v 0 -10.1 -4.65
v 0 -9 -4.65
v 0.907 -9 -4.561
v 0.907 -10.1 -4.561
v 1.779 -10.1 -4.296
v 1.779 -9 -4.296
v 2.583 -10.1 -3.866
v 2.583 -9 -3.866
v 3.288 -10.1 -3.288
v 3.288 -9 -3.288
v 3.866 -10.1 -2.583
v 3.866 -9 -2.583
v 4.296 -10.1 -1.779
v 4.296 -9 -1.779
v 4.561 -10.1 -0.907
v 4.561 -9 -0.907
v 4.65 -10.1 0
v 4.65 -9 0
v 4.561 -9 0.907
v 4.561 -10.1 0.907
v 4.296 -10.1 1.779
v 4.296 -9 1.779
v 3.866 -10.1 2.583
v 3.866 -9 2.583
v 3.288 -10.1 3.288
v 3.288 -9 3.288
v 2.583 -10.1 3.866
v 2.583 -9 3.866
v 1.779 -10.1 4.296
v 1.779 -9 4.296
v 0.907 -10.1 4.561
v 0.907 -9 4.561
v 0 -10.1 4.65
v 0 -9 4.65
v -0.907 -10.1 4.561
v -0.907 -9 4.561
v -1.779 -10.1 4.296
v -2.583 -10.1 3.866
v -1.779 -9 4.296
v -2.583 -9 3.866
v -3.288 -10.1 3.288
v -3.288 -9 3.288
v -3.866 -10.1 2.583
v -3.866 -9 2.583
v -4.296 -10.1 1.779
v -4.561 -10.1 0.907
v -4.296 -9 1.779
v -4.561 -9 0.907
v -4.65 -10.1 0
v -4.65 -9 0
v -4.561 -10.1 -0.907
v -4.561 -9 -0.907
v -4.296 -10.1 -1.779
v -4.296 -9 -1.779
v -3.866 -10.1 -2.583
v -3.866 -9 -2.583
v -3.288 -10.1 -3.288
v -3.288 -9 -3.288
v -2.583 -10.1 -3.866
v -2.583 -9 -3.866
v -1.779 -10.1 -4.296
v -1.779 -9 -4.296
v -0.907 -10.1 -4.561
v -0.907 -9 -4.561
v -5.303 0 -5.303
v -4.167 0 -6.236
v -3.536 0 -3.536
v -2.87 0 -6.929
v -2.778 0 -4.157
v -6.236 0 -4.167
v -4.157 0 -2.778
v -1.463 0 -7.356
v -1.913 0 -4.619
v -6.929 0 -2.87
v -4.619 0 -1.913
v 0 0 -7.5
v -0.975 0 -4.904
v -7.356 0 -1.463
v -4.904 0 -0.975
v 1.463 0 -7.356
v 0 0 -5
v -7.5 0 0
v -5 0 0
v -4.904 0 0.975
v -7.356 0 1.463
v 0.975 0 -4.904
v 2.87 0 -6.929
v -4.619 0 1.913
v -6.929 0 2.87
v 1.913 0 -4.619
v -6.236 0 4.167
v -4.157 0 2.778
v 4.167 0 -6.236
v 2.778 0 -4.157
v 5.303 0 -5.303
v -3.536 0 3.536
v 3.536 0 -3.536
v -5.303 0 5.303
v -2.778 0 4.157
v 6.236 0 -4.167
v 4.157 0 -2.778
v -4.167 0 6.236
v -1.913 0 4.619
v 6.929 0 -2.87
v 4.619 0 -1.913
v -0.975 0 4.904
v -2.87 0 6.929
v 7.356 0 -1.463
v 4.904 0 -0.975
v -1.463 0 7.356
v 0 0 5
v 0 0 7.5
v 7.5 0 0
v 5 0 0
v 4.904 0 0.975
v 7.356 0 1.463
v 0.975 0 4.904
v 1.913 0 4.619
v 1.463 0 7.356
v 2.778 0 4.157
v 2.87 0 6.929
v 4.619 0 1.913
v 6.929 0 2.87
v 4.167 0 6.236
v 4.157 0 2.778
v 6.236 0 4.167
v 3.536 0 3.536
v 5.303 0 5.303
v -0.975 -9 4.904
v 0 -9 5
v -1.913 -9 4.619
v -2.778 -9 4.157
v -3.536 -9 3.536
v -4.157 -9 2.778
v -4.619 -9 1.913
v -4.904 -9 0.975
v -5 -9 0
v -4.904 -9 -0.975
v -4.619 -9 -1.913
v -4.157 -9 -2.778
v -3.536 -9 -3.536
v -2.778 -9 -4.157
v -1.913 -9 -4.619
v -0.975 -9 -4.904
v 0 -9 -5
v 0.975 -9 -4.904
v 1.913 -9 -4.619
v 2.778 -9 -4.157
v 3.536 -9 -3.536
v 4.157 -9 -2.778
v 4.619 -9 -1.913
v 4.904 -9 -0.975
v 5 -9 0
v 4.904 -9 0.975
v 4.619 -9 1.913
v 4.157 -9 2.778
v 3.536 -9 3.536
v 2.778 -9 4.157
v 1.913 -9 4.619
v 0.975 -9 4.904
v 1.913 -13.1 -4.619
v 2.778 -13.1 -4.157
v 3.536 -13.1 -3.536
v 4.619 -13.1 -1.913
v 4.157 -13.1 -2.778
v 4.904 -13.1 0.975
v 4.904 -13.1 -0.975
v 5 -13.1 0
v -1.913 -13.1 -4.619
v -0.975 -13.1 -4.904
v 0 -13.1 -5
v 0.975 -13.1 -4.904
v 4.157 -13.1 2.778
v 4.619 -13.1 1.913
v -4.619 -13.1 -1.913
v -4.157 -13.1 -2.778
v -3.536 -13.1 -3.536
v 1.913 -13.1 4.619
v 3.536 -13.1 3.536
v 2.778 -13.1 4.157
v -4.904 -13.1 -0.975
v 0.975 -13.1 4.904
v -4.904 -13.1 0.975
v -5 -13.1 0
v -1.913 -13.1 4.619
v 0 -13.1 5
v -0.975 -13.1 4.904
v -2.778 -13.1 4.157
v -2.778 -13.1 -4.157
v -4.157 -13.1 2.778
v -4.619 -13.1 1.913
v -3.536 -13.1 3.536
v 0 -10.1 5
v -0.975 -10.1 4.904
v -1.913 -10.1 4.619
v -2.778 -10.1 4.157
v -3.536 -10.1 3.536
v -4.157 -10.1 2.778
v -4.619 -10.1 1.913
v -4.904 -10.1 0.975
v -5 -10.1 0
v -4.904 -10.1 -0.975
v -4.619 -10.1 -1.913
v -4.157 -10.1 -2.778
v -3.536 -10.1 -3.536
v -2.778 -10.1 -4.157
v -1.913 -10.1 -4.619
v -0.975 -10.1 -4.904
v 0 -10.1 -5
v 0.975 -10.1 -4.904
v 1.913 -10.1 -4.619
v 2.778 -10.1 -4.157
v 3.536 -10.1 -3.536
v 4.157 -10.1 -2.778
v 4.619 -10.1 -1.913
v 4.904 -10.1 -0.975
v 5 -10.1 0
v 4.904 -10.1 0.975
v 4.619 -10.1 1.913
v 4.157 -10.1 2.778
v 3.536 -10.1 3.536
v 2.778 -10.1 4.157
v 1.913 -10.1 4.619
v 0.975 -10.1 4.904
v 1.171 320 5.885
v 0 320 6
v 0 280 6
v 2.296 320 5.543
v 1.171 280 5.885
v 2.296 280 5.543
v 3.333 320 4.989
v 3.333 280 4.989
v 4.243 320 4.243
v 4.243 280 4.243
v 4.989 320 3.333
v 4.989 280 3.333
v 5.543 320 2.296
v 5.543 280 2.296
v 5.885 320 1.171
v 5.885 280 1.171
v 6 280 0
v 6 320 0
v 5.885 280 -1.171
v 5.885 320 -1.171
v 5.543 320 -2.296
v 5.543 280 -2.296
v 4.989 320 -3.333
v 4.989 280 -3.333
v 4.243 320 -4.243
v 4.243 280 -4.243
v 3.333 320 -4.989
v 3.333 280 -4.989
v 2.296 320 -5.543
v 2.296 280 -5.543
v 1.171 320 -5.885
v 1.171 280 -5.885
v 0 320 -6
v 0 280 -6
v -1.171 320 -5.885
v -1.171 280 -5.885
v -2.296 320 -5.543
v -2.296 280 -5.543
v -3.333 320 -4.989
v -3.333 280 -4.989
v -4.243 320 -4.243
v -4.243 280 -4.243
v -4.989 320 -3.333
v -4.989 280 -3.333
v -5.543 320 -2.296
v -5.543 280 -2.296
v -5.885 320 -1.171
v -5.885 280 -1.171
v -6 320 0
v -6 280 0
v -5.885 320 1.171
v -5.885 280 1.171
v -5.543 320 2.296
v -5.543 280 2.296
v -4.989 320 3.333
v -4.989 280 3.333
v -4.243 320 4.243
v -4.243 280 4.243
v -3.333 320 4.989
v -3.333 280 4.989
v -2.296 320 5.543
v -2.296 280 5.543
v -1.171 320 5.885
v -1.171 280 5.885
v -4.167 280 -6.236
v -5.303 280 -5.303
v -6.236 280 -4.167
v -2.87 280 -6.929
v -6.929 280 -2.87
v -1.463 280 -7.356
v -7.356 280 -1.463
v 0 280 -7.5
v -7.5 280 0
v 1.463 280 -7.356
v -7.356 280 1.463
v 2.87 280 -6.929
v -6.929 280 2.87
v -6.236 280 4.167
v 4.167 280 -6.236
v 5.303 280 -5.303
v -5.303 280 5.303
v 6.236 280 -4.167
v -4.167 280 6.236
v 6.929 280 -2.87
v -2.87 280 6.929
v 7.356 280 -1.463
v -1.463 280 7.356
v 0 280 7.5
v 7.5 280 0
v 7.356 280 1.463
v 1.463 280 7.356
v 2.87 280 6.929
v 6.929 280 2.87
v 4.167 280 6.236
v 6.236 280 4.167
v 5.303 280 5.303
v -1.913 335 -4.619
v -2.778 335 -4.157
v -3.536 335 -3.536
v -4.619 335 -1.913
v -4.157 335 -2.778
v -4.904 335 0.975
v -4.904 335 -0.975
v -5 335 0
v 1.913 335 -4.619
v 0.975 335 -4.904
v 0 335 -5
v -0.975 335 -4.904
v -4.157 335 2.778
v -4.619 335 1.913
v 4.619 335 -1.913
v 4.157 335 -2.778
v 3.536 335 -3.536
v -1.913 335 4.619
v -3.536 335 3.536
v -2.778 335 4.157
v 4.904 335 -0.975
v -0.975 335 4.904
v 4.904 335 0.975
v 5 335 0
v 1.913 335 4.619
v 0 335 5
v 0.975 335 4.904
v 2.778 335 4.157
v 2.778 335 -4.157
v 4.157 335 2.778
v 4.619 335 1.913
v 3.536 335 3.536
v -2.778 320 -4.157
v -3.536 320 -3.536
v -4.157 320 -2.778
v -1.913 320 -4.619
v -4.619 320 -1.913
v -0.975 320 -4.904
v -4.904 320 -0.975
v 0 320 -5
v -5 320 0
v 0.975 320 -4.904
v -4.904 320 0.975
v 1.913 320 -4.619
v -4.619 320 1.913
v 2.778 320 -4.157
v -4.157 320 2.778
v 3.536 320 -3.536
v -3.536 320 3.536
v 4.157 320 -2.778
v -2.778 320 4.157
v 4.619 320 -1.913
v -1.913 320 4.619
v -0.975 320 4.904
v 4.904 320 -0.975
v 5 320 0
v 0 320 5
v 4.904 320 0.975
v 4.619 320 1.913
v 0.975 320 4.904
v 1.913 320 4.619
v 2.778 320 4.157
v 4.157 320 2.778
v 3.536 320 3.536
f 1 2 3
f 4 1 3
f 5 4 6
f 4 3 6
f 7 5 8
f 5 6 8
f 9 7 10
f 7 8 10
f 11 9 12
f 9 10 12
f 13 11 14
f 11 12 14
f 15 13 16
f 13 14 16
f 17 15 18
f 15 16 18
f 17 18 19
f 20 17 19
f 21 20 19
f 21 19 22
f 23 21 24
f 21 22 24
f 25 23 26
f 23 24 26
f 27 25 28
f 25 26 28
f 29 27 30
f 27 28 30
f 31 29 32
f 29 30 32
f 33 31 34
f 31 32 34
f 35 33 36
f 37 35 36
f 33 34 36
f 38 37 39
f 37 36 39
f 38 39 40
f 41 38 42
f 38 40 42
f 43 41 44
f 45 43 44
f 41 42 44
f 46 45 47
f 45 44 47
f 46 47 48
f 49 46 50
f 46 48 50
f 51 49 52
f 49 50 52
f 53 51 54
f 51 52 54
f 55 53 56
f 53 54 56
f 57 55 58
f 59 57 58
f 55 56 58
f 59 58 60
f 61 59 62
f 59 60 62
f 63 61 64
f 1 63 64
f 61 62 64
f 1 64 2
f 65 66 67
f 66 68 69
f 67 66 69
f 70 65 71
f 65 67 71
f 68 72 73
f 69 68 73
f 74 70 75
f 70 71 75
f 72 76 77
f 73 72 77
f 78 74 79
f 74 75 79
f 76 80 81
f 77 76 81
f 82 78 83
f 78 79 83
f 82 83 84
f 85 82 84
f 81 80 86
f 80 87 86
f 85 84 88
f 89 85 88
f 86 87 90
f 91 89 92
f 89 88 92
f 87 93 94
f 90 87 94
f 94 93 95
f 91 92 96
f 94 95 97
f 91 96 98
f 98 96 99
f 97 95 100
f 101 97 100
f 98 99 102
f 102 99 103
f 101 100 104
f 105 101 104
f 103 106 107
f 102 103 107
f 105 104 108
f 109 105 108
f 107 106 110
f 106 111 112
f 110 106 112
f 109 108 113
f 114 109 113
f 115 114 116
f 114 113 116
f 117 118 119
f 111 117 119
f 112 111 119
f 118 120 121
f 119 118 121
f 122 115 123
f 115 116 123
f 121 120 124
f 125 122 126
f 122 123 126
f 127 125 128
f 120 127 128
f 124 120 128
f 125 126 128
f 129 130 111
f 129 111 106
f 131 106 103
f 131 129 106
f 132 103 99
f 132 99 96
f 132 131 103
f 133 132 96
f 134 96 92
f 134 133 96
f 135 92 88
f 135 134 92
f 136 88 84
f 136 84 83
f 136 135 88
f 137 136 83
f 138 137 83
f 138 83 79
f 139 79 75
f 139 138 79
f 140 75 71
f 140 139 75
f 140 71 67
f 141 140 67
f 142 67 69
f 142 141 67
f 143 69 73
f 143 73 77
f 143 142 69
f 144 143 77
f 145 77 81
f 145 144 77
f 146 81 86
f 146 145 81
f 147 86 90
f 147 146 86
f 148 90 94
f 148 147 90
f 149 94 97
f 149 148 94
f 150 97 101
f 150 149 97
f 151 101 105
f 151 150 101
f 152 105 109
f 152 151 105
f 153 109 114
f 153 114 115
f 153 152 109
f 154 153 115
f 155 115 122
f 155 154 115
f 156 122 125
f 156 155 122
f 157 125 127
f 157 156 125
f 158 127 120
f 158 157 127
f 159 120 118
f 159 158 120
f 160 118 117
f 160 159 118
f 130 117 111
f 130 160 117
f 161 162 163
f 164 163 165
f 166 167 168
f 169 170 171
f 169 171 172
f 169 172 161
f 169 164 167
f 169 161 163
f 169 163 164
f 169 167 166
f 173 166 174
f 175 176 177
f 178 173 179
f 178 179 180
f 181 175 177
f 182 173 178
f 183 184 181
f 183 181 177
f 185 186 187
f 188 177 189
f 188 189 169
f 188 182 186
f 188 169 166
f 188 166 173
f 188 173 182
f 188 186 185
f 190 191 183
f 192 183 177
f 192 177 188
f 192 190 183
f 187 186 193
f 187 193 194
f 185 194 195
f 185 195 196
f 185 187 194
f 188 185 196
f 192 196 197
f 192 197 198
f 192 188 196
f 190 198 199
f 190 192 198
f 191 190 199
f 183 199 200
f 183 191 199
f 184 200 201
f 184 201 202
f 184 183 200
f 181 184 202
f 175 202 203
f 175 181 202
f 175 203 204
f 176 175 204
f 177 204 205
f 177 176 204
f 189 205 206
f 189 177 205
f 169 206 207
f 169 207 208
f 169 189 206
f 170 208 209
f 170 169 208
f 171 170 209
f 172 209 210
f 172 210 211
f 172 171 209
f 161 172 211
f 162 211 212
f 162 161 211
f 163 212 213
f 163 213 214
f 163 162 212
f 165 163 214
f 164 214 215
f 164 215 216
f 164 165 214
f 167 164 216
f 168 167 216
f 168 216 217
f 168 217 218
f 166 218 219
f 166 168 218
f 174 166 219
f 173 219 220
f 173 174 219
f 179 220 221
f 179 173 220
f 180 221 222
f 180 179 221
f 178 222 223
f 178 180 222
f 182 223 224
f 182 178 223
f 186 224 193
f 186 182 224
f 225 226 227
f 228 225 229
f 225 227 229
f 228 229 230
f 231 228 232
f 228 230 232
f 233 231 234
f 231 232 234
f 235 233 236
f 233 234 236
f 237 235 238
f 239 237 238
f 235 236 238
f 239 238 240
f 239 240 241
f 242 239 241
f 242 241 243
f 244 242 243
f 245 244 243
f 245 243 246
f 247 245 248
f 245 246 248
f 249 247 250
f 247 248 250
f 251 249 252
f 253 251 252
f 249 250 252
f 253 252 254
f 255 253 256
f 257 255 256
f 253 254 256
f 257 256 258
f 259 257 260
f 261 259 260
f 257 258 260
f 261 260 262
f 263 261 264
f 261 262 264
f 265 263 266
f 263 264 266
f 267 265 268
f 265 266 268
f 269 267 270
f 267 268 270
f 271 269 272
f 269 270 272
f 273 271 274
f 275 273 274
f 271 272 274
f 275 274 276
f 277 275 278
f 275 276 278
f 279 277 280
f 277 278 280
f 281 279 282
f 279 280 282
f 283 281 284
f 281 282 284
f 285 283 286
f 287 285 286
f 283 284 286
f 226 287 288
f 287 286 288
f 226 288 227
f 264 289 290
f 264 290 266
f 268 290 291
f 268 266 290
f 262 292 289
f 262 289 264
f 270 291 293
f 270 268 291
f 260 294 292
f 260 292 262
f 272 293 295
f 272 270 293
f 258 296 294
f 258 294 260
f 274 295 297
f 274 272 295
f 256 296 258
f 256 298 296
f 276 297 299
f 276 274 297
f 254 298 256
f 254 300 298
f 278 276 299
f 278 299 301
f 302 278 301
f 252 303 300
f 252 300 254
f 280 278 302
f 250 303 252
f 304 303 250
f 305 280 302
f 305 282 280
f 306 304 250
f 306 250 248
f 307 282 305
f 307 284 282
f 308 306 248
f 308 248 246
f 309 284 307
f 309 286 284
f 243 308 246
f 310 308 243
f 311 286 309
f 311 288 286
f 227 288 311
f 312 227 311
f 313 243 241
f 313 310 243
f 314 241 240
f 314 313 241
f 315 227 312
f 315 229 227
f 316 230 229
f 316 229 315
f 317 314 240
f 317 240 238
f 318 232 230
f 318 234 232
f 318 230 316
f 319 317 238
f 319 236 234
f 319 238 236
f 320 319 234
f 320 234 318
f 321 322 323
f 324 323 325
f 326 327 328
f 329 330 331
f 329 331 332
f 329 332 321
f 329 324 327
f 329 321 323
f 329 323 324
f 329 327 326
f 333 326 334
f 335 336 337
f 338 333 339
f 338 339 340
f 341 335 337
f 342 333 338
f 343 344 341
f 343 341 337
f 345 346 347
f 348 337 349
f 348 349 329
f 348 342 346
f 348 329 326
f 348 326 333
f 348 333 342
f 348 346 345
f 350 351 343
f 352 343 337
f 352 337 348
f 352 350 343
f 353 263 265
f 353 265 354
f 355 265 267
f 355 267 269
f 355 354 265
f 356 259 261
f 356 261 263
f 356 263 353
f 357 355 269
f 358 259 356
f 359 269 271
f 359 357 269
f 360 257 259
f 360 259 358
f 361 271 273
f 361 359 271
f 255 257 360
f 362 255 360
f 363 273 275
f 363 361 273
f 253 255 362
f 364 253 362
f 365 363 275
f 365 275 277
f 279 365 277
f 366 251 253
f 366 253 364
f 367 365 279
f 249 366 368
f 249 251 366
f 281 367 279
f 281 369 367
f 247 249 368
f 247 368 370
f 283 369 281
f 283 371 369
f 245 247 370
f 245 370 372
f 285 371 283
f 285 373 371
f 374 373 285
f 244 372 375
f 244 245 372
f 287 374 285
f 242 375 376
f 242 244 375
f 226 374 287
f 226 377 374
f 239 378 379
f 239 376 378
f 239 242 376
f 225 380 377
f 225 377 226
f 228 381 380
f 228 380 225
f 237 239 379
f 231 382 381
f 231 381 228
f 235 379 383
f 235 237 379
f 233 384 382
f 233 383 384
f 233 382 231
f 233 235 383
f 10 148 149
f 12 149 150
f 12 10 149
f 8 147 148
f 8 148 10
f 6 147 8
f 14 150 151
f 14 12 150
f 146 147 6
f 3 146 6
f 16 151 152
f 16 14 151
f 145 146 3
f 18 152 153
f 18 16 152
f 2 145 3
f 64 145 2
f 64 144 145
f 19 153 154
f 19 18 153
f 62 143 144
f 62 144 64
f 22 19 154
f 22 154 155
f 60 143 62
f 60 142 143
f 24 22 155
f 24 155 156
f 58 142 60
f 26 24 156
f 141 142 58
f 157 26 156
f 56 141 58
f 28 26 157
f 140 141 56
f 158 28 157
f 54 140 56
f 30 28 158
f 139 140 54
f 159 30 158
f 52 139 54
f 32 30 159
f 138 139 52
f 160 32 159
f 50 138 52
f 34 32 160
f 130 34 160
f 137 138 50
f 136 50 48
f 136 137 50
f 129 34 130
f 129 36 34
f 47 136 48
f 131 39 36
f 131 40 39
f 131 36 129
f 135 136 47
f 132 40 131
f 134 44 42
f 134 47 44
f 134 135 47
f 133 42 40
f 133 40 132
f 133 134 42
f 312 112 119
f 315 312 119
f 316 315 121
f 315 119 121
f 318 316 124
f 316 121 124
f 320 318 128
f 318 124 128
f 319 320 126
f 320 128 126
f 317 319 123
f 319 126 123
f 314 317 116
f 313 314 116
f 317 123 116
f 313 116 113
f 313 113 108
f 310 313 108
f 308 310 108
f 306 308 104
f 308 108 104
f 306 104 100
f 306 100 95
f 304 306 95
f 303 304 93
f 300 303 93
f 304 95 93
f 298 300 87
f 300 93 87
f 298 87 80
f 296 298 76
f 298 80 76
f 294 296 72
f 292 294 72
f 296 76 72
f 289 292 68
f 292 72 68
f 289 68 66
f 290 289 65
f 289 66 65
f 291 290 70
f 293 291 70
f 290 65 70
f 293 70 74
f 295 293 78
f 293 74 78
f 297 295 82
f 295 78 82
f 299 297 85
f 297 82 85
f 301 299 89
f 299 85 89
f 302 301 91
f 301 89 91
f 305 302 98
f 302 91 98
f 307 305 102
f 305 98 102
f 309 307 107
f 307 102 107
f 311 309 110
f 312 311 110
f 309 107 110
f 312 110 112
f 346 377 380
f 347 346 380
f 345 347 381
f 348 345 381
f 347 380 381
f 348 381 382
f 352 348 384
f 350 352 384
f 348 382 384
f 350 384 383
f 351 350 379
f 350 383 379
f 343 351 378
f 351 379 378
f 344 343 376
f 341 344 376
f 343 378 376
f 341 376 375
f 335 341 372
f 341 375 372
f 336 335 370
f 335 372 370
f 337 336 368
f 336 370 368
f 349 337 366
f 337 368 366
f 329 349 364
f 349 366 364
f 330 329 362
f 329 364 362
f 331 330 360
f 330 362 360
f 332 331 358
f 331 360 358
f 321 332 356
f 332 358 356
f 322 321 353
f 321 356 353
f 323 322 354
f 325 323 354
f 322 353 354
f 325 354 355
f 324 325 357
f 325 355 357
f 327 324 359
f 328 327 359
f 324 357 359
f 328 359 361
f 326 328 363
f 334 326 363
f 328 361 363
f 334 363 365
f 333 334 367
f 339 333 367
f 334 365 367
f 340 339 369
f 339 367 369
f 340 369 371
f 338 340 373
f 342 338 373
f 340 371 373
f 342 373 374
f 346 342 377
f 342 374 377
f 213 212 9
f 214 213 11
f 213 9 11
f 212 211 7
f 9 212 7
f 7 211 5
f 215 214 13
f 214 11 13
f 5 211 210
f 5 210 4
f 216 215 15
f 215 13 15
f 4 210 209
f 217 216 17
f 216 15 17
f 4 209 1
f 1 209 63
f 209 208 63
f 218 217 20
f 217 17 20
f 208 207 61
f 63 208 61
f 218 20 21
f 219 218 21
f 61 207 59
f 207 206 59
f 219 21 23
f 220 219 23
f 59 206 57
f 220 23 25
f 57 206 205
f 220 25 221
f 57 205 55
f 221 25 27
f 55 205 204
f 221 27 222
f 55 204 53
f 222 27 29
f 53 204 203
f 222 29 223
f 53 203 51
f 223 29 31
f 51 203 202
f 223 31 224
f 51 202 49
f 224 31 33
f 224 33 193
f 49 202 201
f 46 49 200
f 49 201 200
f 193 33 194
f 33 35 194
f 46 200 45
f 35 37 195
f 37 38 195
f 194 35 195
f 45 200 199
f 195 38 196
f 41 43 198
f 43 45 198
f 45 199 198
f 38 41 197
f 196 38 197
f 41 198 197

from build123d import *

# Parameters (mm, degrees)
SKETCH_1_R      = 7.5
EXTRUDE_1_DEPTH = 280
SKETCH_2_R      = 6
EXTRUDE_2_DEPTH = 40
SKETCH_3_R      = 5
EXTRUDE_3_DEPTH = 15
EXTRUDE_START   = 9
SKETCH_4_R      = 5
EXTRUDE_4_DEPTH = 9
SKETCH_5_R      = 4.65
EXTRUDE_5_DEPTH = 1.1
EXTRUDE_START_2 = 3
SKETCH_6_R      = 5
EXTRUDE_6_DEPTH = 3


with BuildPart() as part:
    # 草图1 → 凸台-拉伸1 (new body)
    with BuildSketch(Plane(origin=(0, 0, 0), x_dir=(1, 0, 0), z_dir=(0, 1, 0))):
        with Locations(Location((0, 0, 0), (0, 0, 270))):
            Circle(SKETCH_1_R)
    extrude(amount=EXTRUDE_1_DEPTH)

    # 草图2 → 凸台-拉伸2 (add)
    with BuildSketch(Plane(origin=(0, 280, 0), x_dir=(1, 0, 0), z_dir=(0, 1, 0))):
        with Locations(Location((0, 0, 0), (0, 0, 270))):
            Circle(SKETCH_2_R)
    extrude(amount=EXTRUDE_2_DEPTH)

    # 草图3 → 凸台-拉伸3 (add)
    with BuildSketch(Plane(origin=(0, 320, 0), x_dir=(1, 0, 0), z_dir=(0, 1, 0))):
        with Locations(Location((0, 0, 0), (0, 0, 270))):
            Circle(SKETCH_3_R)
    extrude(amount=EXTRUDE_3_DEPTH)

    # 草图4 → 凸台-拉伸4 (add)
    with BuildSketch(Plane.XZ.offset(EXTRUDE_START)):
        with Locations(Location((0, 0, 0), (0, 0, 90))):
            Circle(SKETCH_4_R)
    extrude(amount=-EXTRUDE_4_DEPTH)

    # 草图5 → 凸台-拉伸5 (add)
    with BuildSketch(Plane.XZ.offset(9)):
        with Locations(Location((0, 0, 0), (0, 0, 270))):
            Circle(SKETCH_5_R)
    extrude(amount=EXTRUDE_5_DEPTH)

    # 草图6 → 凸台-拉伸6 (add)
    with BuildSketch(Plane.XZ.offset(10.1).offset(EXTRUDE_START_2)):
        with Locations(Location((0, 0, 0), (0, 0, 90))):
            Circle(SKETCH_6_R)
    extrude(amount=-EXTRUDE_6_DEPTH)


solid = part.part
